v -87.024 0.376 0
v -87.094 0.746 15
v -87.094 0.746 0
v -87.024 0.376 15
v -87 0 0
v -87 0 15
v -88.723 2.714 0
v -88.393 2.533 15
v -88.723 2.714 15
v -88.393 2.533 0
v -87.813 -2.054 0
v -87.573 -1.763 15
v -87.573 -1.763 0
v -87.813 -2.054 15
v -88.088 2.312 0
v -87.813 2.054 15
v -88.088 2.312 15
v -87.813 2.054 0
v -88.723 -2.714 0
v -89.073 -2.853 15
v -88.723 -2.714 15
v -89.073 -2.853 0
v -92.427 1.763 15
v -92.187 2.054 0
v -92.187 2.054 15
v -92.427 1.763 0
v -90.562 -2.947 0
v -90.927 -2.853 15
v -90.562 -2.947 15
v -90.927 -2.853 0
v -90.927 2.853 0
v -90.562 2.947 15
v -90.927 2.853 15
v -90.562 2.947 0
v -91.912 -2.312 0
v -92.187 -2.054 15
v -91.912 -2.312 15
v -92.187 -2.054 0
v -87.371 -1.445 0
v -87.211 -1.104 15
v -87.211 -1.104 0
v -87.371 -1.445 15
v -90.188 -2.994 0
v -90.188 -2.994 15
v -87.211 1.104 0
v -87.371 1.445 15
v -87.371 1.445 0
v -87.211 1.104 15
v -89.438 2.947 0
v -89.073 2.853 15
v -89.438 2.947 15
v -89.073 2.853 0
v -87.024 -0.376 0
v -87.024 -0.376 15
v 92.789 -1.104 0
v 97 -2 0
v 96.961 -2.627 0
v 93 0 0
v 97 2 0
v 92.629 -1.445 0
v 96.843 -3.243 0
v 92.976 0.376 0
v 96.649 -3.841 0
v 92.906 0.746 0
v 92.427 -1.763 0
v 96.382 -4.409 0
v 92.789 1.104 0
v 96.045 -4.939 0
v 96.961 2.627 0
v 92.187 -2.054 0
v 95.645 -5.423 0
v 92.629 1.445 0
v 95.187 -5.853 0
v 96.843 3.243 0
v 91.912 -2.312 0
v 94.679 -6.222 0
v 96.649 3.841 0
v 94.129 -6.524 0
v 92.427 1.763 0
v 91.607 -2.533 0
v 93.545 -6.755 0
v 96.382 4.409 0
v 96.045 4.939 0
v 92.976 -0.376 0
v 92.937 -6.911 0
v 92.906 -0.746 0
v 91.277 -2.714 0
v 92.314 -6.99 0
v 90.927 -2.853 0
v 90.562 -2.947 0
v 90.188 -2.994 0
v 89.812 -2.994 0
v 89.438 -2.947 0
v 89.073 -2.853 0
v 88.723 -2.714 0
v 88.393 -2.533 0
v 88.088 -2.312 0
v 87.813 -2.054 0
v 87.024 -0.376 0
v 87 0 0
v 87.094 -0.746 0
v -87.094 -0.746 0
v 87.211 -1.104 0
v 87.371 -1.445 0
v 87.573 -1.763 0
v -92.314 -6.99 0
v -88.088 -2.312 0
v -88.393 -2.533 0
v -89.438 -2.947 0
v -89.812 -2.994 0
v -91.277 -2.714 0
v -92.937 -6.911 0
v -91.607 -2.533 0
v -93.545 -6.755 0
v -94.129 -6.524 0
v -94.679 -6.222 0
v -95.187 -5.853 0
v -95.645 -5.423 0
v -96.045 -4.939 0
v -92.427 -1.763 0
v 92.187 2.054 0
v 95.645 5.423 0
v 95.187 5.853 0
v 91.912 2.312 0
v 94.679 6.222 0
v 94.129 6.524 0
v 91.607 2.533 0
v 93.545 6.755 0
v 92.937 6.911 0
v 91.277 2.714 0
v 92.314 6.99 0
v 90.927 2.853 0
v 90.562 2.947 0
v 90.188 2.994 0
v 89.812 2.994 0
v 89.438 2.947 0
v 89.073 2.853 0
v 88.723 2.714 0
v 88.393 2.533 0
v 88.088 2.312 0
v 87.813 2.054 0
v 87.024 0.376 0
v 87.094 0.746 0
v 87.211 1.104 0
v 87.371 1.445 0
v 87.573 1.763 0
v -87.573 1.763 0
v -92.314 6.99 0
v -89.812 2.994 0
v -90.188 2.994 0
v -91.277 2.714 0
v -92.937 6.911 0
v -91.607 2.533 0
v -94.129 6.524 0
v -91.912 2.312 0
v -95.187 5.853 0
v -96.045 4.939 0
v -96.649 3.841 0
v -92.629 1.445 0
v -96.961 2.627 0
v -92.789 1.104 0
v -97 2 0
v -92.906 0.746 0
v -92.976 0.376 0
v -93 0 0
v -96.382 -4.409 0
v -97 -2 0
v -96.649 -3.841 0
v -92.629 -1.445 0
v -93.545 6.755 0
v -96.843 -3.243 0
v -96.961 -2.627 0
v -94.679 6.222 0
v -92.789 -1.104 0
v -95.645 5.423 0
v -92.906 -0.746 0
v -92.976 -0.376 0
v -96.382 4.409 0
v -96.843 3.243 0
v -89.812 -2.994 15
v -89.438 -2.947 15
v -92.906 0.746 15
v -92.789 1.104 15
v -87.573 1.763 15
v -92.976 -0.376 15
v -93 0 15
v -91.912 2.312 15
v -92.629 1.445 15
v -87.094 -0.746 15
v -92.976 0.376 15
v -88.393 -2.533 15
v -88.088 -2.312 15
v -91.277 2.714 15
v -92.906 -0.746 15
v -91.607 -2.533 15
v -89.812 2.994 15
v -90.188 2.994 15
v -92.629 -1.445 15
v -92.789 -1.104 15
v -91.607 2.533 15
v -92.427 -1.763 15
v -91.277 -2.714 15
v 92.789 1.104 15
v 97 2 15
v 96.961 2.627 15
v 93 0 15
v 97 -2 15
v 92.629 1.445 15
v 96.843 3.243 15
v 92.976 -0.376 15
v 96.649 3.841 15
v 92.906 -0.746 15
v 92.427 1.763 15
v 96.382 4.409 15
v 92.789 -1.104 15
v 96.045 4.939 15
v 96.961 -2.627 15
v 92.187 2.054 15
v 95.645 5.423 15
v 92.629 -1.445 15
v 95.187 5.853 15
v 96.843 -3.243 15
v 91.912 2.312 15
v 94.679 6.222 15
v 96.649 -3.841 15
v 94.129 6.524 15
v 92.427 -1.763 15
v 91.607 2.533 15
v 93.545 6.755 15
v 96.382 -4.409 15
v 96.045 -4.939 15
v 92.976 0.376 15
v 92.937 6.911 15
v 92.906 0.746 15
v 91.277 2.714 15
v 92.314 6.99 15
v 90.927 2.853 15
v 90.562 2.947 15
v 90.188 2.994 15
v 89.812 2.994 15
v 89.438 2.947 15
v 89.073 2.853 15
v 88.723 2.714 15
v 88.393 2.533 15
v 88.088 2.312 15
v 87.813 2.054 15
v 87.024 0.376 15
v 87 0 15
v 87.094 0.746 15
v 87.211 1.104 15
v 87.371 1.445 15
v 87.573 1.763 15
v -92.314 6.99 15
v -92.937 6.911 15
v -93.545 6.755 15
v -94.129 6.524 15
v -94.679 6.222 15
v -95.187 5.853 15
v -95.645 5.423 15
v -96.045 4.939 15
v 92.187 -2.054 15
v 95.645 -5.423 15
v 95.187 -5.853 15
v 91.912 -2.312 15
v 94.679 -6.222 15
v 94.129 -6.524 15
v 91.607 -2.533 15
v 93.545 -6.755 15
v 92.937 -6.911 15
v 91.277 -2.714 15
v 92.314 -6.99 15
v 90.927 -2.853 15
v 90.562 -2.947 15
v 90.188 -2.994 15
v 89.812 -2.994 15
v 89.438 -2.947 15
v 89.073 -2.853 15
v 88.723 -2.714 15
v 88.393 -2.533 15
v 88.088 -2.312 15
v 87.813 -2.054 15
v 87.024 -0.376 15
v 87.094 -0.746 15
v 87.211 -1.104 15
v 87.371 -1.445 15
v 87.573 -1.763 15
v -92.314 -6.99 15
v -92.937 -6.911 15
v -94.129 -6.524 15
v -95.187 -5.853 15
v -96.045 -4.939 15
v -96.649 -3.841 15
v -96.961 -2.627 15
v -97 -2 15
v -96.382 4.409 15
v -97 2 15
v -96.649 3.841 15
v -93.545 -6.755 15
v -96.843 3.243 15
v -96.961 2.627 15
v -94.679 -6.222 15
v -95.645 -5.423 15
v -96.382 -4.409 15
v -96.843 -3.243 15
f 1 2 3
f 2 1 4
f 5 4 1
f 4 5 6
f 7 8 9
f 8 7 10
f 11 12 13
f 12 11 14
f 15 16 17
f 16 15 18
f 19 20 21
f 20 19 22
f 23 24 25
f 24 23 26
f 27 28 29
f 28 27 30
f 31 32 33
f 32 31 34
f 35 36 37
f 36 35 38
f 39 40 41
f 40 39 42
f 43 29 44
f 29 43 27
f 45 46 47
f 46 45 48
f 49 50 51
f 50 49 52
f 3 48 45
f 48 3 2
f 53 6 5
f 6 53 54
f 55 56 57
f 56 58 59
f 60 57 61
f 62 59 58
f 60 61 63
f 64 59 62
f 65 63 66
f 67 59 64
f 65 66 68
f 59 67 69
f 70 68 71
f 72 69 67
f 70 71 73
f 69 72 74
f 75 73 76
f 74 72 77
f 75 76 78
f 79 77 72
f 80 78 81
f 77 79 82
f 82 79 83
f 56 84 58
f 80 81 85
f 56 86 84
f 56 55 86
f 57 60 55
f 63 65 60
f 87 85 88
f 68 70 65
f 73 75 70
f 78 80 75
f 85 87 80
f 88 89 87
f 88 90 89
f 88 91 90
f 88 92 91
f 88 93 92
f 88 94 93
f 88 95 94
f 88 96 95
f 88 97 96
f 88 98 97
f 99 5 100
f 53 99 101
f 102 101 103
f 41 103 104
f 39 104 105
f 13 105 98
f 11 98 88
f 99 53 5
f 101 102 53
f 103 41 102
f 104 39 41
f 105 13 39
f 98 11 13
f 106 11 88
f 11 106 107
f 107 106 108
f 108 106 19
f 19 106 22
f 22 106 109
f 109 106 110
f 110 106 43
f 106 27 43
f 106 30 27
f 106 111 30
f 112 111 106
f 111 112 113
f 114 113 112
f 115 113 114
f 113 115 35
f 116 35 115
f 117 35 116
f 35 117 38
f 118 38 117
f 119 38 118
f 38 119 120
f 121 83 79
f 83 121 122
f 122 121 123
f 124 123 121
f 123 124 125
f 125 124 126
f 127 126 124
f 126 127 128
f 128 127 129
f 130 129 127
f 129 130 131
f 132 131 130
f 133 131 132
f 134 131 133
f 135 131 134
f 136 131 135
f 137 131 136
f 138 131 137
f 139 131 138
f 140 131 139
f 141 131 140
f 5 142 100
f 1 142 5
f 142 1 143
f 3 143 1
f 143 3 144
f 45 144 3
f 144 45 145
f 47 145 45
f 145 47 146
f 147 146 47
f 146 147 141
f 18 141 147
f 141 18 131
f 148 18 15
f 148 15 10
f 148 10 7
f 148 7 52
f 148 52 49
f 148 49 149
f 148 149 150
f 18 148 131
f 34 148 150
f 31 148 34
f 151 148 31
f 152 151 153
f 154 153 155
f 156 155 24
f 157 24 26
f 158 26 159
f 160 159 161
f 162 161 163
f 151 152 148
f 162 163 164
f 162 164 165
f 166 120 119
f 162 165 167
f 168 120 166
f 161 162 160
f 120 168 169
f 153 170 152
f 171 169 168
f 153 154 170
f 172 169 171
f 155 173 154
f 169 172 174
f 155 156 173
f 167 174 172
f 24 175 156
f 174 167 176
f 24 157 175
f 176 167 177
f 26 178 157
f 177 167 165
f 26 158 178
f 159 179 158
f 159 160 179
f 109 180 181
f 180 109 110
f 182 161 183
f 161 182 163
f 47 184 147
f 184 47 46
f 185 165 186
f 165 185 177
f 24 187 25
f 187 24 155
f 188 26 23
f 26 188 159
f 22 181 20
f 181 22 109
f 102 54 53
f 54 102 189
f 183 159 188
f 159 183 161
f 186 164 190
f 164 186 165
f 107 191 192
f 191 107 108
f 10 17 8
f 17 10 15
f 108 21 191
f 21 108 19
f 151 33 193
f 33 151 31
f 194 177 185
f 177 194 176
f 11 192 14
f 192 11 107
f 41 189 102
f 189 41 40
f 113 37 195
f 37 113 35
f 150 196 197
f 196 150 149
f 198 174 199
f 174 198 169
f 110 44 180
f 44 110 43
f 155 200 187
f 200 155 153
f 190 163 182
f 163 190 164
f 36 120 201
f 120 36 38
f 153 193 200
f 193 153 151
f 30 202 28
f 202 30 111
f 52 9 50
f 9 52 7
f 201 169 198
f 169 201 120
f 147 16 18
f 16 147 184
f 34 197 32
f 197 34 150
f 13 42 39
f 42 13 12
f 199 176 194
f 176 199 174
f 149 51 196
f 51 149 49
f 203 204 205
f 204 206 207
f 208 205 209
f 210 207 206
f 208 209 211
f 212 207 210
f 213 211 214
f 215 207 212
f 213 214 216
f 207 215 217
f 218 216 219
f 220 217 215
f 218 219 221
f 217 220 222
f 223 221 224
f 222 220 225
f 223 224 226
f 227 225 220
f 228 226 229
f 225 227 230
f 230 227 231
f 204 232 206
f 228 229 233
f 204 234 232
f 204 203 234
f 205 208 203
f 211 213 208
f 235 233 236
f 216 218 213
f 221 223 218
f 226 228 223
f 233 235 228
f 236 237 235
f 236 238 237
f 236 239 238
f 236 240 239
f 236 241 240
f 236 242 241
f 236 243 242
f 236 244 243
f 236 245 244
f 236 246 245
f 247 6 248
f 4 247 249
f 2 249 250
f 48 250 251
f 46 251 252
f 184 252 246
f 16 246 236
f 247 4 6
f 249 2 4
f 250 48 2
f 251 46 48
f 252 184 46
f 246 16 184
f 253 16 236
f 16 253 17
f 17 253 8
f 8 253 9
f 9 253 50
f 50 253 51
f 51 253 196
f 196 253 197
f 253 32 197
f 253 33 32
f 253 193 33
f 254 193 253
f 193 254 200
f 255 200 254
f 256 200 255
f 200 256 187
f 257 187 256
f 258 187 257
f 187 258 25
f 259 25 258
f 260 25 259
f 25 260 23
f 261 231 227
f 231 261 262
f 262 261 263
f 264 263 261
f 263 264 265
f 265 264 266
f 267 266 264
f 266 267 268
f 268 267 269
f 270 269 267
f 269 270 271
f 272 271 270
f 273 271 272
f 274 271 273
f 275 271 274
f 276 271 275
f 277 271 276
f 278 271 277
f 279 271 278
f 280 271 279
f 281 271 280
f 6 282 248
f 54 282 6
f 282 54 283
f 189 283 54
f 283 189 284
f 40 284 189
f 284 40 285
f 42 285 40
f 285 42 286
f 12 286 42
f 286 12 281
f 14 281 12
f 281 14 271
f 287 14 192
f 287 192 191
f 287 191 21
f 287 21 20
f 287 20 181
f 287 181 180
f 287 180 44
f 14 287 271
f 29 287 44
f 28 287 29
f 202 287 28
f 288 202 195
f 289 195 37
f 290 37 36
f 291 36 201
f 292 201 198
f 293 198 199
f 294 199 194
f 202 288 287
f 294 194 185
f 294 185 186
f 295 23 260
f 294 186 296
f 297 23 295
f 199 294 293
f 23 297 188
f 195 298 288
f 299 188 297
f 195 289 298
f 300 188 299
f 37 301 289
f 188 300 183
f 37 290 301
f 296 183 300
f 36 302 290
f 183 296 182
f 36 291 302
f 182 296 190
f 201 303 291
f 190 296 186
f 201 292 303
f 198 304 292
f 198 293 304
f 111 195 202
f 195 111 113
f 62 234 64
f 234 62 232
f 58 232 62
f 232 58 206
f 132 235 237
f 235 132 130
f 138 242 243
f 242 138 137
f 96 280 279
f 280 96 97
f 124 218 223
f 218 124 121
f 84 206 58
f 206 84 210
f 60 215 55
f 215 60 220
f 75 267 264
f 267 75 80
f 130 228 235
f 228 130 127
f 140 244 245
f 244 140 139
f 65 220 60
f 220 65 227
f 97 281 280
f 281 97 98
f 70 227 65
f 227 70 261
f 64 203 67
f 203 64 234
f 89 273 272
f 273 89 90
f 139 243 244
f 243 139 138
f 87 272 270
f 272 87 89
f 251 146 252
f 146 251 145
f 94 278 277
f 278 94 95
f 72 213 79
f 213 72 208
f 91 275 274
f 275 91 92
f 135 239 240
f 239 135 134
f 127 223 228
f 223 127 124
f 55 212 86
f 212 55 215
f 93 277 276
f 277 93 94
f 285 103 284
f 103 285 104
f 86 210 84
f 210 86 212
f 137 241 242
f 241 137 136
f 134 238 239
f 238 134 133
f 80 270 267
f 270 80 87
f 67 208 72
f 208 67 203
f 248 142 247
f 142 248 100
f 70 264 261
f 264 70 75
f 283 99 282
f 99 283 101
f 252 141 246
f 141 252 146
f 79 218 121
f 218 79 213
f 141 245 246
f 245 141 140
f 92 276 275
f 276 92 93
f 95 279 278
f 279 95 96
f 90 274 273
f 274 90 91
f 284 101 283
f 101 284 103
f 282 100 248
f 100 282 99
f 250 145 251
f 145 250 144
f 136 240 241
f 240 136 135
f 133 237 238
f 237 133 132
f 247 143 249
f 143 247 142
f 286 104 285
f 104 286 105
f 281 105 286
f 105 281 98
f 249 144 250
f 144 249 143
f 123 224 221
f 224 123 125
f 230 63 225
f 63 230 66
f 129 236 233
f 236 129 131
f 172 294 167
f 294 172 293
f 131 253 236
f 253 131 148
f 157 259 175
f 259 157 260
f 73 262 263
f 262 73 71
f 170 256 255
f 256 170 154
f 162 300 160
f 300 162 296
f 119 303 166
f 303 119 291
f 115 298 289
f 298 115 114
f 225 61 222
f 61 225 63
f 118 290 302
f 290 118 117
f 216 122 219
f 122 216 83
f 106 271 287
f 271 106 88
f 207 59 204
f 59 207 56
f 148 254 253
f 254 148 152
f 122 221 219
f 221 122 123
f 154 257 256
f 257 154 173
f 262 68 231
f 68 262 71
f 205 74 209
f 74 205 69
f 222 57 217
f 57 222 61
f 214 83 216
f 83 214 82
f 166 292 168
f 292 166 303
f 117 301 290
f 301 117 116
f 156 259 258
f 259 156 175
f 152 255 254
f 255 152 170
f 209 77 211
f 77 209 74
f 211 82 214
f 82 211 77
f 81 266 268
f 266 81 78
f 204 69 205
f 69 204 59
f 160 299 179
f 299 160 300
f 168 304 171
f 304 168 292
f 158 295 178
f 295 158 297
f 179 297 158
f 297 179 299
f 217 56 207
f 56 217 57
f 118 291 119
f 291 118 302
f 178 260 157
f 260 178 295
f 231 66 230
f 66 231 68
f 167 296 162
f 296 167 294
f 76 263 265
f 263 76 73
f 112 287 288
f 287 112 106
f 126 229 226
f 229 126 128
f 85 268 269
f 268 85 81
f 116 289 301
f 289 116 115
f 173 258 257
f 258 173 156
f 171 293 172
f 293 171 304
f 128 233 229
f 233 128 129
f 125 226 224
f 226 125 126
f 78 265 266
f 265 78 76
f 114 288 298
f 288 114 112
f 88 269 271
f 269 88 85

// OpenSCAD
$fn = 50;


difference() {
	union() {
		hull() {
			translate(v = [-92.0000000000, 2.0000000000, 0]) {
				cylinder(h = 15, r = 5);
			}
			translate(v = [92.0000000000, 2.0000000000, 0]) {
				cylinder(h = 15, r = 5);
			}
			translate(v = [-92.0000000000, -2.0000000000, 0]) {
				cylinder(h = 15, r = 5);
			}
			translate(v = [92.0000000000, -2.0000000000, 0]) {
				cylinder(h = 15, r = 5);
			}
		}
	}
	union() {
		translate(v = [-90.0000000000, 0.0000000000, 0]) {
			cylinder(h = 15, r = 3.0000000000);
		}
		translate(v = [90.0000000000, 0.0000000000, 0]) {
			cylinder(h = 15, r = 3.0000000000);
		}
		translate(v = [-90.0000000000, 0.0000000000, 0]) {
			cylinder(h = 15, r = 1.5000000000);
		}
		translate(v = [90.0000000000, 0.0000000000, 0]) {
			cylinder(h = 15, r = 1.5000000000);
		}
		translate(v = [-90.0000000000, 0.0000000000, 0]) {
			cylinder(h = 15, r = 1.5000000000);
		}
		translate(v = [90.0000000000, 0.0000000000, 0]) {
			cylinder(h = 15, r = 1.5000000000);
		}
		translate(v = [-90.0000000000, 0.0000000000, 0]) {
			cylinder(h = 15, r = 1.5000000000);
		}
		translate(v = [90.0000000000, 0.0000000000, 0]) {
			cylinder(h = 15, r = 1.5000000000);
		}
	}
}
